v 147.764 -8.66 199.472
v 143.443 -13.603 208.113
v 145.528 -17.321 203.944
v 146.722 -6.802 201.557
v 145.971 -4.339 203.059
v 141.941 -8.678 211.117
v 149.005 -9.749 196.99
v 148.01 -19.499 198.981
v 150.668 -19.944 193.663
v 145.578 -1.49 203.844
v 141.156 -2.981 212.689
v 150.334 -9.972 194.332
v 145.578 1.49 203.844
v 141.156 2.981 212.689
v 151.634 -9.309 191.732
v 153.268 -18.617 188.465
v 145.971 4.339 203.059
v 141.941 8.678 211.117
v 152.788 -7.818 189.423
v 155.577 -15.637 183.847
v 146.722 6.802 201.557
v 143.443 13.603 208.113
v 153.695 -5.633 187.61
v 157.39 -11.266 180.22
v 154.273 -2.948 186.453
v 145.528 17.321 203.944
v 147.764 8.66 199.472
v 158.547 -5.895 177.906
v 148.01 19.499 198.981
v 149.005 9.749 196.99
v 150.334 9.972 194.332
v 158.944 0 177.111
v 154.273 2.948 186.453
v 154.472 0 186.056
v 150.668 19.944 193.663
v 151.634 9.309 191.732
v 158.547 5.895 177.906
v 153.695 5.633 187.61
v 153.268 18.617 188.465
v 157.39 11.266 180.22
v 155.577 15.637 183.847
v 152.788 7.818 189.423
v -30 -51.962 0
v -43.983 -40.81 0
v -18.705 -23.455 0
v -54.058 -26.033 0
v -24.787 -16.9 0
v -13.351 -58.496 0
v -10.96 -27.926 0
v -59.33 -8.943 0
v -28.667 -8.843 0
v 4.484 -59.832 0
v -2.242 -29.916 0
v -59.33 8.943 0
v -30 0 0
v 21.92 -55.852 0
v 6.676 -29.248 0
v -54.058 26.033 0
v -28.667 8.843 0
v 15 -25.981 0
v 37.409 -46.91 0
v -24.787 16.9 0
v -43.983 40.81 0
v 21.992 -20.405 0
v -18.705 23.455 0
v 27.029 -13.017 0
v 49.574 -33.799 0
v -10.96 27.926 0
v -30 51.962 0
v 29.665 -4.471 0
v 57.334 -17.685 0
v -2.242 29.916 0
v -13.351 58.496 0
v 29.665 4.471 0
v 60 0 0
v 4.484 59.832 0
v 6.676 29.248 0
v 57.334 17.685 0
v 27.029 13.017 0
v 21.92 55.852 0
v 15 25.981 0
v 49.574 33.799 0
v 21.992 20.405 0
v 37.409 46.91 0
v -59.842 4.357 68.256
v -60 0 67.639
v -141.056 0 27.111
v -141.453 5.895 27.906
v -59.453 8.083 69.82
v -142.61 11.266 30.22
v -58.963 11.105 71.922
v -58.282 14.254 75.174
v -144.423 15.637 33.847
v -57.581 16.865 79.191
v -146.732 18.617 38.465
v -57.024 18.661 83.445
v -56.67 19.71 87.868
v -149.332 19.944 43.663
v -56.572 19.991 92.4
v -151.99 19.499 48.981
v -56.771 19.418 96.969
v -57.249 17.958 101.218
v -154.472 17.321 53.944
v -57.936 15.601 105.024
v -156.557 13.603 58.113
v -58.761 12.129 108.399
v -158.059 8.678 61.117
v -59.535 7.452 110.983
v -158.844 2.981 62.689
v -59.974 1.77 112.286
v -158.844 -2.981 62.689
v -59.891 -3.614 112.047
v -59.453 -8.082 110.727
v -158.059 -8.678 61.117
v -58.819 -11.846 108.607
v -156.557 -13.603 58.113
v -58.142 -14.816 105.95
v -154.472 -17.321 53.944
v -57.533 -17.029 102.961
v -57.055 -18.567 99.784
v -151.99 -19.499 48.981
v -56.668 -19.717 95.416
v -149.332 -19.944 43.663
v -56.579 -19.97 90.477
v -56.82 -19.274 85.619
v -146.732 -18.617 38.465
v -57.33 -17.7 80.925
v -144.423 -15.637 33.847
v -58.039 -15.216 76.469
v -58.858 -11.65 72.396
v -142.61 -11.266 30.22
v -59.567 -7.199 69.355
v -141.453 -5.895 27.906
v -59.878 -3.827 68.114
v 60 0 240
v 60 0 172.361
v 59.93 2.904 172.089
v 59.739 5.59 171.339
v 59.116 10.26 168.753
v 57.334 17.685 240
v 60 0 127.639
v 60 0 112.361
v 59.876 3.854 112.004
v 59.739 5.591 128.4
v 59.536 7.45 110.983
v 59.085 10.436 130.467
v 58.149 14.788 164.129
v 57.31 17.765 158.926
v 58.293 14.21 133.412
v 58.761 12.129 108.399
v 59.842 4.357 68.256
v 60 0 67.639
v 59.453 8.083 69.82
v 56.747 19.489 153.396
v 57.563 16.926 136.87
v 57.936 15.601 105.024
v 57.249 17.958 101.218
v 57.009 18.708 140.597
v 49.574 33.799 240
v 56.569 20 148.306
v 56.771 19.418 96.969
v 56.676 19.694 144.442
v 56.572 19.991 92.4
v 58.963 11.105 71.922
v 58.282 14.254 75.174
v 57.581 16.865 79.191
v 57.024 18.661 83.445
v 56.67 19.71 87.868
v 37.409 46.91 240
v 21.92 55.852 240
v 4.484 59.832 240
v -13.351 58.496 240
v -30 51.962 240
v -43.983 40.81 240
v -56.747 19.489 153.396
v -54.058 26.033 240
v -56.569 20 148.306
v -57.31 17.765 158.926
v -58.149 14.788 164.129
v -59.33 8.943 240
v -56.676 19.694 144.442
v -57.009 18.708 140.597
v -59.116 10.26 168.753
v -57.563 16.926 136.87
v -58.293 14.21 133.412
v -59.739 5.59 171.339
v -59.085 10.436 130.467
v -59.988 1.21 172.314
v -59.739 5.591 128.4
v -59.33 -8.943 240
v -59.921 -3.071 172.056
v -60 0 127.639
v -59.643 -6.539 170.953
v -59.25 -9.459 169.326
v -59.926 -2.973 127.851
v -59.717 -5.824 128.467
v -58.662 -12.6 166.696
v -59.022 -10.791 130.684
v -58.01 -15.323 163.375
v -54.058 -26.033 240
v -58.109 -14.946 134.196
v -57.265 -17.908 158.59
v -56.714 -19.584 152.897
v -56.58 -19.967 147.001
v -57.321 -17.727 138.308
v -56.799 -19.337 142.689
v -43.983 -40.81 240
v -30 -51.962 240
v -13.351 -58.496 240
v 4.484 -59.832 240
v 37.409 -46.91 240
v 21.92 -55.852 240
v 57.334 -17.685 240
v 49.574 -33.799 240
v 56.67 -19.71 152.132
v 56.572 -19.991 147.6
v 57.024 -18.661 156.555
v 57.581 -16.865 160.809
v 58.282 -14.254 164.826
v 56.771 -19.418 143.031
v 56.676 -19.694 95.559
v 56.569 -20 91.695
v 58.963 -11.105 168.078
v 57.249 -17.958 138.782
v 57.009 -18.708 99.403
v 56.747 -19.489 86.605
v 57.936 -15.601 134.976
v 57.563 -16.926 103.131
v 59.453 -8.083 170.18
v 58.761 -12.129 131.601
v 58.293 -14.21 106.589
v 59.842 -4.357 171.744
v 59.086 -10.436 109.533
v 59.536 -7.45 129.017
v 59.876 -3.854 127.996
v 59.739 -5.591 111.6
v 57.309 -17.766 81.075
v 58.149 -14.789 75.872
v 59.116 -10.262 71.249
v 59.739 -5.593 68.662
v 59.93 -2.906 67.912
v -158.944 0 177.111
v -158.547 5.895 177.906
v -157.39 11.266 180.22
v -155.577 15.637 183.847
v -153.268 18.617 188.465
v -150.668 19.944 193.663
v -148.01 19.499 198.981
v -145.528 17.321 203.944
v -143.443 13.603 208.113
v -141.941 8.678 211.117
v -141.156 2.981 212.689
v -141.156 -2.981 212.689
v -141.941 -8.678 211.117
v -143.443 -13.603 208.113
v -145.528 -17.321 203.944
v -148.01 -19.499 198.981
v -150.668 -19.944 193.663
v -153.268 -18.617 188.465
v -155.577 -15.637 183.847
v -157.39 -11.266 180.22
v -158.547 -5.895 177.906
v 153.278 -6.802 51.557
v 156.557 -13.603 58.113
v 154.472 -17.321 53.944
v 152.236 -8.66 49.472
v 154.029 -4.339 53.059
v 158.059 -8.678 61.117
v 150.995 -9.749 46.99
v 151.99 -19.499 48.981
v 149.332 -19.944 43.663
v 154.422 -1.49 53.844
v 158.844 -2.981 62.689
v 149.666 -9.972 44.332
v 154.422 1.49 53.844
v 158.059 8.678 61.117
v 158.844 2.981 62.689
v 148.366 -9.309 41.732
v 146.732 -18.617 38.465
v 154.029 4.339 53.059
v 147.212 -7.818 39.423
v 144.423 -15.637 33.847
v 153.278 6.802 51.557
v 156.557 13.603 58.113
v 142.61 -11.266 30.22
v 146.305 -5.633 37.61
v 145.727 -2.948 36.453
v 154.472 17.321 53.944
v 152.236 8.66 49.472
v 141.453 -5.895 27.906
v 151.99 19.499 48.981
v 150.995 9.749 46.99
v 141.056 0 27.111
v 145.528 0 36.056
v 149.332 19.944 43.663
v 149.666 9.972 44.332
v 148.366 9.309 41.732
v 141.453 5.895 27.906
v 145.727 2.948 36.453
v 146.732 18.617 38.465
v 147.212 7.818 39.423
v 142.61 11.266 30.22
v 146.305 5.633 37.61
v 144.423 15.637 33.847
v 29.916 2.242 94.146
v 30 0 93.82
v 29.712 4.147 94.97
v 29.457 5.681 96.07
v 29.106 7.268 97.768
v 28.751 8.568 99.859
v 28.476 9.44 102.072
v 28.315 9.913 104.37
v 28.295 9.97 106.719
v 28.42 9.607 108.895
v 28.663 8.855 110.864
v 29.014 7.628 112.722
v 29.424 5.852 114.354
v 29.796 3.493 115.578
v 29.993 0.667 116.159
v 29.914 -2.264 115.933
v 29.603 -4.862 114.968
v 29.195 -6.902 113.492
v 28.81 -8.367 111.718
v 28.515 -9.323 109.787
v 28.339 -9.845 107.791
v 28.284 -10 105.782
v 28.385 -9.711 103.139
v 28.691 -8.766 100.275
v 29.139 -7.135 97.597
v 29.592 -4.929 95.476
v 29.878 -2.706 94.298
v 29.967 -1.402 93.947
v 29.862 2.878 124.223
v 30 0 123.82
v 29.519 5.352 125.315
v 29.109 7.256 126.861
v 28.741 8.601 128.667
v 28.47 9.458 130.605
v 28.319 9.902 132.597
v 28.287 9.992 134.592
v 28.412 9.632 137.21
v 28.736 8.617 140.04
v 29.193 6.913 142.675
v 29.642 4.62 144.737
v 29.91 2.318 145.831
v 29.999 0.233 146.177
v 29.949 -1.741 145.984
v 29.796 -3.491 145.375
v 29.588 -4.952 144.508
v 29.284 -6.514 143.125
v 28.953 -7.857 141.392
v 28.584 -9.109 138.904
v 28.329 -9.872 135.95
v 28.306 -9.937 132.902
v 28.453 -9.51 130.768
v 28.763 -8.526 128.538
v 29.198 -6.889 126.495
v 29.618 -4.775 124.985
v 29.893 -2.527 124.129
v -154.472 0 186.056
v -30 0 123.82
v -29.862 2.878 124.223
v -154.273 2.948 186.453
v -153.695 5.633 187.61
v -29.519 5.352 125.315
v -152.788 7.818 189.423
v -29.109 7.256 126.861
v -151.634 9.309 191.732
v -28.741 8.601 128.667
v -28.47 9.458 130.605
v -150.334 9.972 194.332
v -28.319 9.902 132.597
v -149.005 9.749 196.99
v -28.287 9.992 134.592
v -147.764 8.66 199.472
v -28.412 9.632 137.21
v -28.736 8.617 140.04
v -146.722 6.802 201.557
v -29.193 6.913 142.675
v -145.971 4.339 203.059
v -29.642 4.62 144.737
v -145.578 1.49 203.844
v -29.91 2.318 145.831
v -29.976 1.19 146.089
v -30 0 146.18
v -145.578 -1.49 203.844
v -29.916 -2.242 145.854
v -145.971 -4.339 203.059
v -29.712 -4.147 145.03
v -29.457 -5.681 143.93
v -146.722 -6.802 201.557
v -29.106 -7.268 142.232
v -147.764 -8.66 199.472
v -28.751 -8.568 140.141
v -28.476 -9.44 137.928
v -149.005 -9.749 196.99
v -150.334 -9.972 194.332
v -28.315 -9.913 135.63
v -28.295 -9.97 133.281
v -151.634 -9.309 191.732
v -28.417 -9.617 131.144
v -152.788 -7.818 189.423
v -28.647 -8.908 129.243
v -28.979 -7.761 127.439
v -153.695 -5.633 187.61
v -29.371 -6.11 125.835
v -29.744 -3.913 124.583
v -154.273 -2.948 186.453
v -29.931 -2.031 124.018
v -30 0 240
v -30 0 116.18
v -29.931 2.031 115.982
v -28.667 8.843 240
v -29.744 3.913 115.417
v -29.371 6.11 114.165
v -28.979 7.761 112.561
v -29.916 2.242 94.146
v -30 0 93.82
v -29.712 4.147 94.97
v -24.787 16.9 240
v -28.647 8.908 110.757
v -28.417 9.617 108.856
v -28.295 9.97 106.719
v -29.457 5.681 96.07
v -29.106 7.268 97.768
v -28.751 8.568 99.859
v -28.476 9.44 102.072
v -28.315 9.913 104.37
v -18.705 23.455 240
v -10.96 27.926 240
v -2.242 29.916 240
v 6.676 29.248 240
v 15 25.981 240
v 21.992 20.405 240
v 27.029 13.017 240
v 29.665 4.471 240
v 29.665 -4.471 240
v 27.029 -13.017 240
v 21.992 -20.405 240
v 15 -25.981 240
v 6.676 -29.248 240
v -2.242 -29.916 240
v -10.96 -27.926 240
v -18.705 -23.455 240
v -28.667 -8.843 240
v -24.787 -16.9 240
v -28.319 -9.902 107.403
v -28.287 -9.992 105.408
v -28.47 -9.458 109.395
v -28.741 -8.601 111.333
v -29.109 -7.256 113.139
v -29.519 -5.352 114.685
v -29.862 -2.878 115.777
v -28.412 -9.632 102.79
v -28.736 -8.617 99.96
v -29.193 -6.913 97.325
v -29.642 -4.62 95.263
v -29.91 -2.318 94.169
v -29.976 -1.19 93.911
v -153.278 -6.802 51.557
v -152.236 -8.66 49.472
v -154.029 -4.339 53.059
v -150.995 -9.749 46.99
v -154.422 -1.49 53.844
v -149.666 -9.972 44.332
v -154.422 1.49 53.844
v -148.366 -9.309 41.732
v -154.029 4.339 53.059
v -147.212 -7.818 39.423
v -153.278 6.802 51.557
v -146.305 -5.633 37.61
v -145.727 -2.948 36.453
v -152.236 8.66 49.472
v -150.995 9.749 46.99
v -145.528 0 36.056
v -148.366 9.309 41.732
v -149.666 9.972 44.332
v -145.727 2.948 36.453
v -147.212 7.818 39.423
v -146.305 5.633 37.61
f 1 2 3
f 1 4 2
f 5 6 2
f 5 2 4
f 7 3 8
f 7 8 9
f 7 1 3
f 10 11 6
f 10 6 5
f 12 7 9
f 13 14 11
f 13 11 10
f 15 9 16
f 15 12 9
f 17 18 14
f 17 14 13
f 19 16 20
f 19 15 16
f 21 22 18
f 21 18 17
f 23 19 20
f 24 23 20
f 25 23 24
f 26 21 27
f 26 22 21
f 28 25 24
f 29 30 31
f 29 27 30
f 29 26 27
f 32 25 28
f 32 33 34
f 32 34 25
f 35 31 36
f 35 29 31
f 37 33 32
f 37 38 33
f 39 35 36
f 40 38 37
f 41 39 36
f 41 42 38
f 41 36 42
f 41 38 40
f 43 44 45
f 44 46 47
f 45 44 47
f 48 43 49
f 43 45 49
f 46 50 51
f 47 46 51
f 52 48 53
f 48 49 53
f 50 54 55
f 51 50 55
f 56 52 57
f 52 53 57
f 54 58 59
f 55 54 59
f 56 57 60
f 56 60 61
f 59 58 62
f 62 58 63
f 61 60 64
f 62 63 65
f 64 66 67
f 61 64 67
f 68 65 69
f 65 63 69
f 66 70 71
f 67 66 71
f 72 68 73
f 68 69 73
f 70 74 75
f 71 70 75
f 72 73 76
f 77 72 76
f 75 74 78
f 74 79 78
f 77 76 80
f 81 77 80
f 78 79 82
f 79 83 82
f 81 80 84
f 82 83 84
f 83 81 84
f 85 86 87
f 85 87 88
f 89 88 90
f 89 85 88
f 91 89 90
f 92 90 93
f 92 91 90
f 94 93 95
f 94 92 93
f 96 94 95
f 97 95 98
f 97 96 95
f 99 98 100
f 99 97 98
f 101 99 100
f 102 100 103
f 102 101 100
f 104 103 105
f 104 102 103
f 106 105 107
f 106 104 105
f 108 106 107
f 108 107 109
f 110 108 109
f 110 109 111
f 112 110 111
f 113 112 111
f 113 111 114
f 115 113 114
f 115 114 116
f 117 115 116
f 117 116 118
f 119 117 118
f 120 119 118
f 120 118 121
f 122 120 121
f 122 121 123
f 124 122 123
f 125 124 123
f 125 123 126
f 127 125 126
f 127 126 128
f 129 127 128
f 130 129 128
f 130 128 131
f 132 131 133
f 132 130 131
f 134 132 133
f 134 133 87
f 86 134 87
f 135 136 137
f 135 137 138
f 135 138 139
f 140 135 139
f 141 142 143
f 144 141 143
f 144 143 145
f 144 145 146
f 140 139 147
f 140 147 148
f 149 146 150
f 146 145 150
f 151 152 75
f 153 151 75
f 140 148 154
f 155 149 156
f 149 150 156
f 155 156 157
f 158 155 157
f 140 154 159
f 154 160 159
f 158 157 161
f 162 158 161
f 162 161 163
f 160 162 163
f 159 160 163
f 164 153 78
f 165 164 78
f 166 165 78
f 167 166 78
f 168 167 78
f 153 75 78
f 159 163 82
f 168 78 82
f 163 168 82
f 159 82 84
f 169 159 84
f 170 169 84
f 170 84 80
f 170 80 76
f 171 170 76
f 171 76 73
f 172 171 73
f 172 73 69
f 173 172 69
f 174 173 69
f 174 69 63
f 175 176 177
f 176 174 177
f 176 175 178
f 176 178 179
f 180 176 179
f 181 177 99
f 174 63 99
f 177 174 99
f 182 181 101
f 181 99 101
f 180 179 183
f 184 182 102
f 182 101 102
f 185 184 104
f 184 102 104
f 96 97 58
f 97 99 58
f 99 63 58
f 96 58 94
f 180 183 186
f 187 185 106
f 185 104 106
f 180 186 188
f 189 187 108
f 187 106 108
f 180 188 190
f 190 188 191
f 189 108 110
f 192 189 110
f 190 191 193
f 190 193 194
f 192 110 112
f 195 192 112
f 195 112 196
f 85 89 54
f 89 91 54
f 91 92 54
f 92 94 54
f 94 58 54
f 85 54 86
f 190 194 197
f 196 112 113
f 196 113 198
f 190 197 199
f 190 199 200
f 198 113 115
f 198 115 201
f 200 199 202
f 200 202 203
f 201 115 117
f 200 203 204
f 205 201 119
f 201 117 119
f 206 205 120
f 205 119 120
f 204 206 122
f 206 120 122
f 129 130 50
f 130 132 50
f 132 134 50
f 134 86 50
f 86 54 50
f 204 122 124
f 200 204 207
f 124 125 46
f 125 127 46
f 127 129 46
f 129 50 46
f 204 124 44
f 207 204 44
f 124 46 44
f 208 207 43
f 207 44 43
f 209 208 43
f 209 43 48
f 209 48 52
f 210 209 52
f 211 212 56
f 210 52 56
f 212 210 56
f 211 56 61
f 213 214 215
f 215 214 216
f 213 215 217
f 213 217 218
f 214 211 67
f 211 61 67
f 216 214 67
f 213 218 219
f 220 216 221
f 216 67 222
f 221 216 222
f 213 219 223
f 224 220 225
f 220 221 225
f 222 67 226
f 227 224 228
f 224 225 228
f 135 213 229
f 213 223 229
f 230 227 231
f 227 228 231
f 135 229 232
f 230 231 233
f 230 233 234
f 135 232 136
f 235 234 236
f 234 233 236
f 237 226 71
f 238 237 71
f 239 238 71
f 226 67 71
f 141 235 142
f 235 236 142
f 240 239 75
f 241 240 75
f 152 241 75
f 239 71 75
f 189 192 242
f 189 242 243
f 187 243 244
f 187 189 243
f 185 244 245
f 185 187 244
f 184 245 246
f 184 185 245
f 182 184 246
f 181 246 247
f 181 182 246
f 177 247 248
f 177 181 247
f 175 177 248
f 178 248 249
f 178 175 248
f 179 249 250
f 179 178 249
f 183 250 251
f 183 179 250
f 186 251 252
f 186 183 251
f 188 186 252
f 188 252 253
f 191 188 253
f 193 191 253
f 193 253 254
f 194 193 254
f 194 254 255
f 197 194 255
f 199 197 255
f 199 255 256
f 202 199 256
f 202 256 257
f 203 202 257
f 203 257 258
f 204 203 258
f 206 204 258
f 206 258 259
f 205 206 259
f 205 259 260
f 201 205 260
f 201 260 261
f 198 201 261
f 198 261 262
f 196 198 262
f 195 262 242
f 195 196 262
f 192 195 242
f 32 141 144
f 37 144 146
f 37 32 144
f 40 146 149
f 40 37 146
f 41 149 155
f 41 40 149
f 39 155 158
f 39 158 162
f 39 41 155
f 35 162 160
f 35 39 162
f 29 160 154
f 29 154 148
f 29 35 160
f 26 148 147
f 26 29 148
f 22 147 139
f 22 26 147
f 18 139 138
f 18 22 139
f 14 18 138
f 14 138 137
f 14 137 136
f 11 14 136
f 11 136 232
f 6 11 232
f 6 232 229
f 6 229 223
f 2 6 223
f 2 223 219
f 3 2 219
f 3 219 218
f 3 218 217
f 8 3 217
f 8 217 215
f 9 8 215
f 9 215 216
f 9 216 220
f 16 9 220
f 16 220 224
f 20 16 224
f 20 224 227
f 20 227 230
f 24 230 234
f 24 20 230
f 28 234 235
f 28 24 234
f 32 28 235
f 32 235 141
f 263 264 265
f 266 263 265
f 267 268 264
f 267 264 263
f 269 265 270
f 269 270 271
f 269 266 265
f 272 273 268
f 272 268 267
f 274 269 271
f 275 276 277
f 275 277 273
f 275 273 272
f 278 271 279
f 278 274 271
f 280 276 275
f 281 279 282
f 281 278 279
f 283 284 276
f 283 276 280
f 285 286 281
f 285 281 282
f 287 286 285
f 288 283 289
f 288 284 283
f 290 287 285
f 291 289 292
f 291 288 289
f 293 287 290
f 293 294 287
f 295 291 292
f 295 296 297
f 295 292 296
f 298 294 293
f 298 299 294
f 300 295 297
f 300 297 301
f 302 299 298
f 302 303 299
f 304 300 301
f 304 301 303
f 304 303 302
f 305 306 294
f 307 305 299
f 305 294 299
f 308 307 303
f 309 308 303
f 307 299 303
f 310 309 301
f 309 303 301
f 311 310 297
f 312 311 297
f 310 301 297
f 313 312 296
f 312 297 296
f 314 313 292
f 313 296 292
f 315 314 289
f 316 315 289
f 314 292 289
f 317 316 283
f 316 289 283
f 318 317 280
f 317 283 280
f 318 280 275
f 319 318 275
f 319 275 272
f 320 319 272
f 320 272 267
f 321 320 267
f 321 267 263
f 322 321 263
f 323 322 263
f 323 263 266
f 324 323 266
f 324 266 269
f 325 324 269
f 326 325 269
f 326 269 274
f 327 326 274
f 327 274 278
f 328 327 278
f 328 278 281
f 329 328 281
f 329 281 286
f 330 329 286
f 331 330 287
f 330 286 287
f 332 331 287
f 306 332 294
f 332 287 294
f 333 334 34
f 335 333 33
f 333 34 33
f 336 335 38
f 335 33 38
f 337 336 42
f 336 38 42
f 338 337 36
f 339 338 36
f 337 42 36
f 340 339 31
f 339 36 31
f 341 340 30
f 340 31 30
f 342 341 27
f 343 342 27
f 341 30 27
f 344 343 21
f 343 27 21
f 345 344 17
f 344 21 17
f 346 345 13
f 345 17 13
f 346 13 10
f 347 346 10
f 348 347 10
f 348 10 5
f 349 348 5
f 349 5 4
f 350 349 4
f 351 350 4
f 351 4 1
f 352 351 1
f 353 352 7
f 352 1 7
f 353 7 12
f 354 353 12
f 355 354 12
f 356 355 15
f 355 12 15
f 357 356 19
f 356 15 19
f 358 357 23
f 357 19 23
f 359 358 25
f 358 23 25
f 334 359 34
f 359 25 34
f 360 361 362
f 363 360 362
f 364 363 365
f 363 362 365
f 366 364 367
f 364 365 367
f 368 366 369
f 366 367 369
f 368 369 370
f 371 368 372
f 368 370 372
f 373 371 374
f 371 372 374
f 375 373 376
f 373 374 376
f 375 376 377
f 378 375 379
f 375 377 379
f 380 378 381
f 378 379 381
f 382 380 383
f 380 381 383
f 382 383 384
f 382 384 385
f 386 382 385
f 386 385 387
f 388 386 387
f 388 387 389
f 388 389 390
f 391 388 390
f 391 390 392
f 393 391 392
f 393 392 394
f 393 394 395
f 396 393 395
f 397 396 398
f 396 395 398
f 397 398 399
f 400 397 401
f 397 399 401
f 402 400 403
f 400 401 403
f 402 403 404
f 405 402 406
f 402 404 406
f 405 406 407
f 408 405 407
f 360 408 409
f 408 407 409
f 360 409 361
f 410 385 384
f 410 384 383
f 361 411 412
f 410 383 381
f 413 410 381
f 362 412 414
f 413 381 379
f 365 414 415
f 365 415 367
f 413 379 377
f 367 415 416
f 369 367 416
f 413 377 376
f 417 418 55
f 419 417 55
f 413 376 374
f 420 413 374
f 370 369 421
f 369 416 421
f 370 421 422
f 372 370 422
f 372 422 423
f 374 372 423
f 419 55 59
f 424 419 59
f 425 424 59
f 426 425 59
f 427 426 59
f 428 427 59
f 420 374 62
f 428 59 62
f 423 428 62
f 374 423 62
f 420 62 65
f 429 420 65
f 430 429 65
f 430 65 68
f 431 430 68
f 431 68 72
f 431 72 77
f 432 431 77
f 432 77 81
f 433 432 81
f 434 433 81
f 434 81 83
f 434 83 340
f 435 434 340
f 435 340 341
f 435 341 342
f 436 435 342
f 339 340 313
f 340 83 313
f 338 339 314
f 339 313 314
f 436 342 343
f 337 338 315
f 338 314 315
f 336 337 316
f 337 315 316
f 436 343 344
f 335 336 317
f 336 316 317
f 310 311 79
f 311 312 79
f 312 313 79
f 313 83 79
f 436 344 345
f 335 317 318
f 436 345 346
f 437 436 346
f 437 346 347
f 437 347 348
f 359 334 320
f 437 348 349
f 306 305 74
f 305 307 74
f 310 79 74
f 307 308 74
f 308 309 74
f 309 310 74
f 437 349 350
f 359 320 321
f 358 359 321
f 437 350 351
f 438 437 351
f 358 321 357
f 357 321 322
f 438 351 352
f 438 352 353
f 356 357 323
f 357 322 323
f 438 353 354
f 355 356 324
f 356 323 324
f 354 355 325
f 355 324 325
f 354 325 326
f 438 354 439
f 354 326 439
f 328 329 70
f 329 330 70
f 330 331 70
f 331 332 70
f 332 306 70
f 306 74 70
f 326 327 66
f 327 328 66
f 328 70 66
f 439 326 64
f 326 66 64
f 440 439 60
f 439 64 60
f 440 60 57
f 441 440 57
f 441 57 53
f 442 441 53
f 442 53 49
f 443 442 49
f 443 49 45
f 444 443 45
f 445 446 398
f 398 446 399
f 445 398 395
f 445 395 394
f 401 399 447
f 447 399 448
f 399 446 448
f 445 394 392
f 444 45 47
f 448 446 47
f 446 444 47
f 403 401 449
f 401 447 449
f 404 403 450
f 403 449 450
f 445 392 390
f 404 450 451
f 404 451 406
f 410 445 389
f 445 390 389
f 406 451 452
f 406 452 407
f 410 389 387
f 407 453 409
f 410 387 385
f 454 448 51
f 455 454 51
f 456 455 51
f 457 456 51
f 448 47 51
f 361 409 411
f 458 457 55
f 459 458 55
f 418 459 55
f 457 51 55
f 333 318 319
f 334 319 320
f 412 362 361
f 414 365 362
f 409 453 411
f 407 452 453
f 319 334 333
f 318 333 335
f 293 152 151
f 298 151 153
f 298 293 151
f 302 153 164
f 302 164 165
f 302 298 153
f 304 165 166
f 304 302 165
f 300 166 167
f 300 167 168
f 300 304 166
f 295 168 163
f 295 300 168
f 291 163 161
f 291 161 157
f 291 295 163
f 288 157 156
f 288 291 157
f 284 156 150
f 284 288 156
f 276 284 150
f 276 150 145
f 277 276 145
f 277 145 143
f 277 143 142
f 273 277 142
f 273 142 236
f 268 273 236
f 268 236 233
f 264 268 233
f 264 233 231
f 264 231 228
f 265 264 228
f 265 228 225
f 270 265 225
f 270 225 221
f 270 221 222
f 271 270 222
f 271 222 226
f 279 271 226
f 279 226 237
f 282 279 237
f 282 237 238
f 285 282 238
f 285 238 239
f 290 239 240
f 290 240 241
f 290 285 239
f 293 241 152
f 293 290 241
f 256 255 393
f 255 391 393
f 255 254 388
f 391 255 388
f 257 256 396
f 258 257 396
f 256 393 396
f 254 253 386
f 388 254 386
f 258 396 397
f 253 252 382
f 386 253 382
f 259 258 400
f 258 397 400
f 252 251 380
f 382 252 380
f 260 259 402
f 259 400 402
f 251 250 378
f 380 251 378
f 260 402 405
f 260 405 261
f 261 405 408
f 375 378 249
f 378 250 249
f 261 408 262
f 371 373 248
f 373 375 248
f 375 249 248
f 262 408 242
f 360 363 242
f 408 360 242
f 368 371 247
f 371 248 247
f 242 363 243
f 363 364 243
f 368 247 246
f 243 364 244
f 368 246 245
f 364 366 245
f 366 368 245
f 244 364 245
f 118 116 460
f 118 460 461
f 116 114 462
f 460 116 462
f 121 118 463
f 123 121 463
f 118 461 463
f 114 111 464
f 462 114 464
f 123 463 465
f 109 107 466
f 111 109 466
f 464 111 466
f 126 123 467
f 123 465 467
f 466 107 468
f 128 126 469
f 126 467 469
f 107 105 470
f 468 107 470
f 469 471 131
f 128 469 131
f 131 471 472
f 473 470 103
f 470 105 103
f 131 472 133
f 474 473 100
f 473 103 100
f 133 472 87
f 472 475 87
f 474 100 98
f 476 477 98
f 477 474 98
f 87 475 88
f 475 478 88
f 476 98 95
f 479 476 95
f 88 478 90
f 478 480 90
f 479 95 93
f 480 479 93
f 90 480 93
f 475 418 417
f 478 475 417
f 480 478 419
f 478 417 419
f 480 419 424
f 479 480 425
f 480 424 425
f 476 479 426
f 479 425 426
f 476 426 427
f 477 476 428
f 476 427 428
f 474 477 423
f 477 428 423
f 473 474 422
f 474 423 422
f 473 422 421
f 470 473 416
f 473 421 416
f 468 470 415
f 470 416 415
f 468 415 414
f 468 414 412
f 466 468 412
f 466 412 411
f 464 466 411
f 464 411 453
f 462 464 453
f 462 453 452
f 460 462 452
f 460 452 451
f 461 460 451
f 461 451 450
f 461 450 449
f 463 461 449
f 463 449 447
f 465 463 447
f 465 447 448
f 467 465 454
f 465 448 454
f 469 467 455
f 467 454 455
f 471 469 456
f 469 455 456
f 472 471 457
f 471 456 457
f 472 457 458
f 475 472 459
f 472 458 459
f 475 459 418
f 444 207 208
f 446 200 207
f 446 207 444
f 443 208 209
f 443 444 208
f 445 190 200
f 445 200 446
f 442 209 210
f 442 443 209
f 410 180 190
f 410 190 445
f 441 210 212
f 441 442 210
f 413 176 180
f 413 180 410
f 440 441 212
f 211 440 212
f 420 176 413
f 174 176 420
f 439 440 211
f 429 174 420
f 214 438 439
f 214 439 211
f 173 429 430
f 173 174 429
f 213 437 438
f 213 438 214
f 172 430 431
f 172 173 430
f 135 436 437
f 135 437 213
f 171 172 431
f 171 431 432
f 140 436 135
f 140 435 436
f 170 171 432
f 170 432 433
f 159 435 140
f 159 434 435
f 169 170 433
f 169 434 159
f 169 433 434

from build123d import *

# Parameters (mm, degrees)
CROQUIS1_R              = 60
SALIENTE_EXTRUIR1_DEPTH = 240
CROQUIS4_R              = 20
SALIENTE_EXTRUIR2_DEPTH = 335.410197
CROQUIS5_R              = 20
SALIENTE_EXTRUIR3_DEPTH = 335.410197
CROQUIS6_R              = 10
CORTAR_EXTRUIR2_DEPTH   = 335.410197
CROQUIS7_R              = 10
CORTAR_EXTRUIR3_DEPTH   = 335.410197
CROQUIS8_R              = 30
CORTAR_EXTRUIR4_DEPTH   = 304


with BuildPart() as part:
    # Croquis1 → Saliente-Extruir1 (new body)
    with BuildSketch(Plane.XY):
        Circle(CROQUIS1_R)
    extrude(amount=SALIENTE_EXTRUIR1_DEPTH)

    # Croquis4 → Saliente-Extruir2 (add)
    with BuildSketch(Plane(origin=(102, 0, -51), x_dir=(-0.44721359549995804, 0, -0.8944271909999159), z_dir=(0.8944271909999159, 0, -0.44721359549995804))):
        with Locations((-107.33126292, 0)):
            Circle(CROQUIS4_R)
    extrude(amount=-SALIENTE_EXTRUIR2_DEPTH)

    # Croquis5 → Saliente-Extruir3 (add)
    with BuildSketch(Plane(origin=(198, 0, 99), x_dir=(0.44721359549995826, 0, -0.8944271909999157), z_dir=(0.8944271909999157, 0, 0.44721359549995826))):
        with Locations((-107.33126292, 0)):
            Circle(CROQUIS5_R)
    extrude(amount=-SALIENTE_EXTRUIR3_DEPTH)

    # Croquis6 → Cortar-Extruir2 (cut)
    with BuildSketch(Plane(origin=(198, 0, 99), x_dir=(0.44721359549995826, 0, -0.8944271909999157), z_dir=(0.8944271909999157, 0, 0.44721359549995826))):
        with Locations((-107.33126292, 0)):
            Circle(CROQUIS6_R)
    extrude(amount=-CORTAR_EXTRUIR2_DEPTH, mode=Mode.SUBTRACT)

    # Croquis7 → Cortar-Extruir3 (cut)
    with BuildSketch(Plane(origin=(102, 0, -51), x_dir=(-0.44721359549995804, 0, -0.8944271909999159), z_dir=(0.8944271909999159, 0, -0.44721359549995804))):
        with Locations((-107.33126292, 0)):
            Circle(CROQUIS7_R)
    extrude(amount=-CORTAR_EXTRUIR3_DEPTH, mode=Mode.SUBTRACT)

    # Croquis8 → Cortar-Extruir4 (cut)
    with BuildSketch(Plane(origin=(0, 0, 0), x_dir=(-1, 0, 0), z_dir=(0, 0, -1))):
        Circle(CROQUIS8_R)
    extrude(amount=-CORTAR_EXTRUIR4_DEPTH, mode=Mode.SUBTRACT)


solid = part.part
